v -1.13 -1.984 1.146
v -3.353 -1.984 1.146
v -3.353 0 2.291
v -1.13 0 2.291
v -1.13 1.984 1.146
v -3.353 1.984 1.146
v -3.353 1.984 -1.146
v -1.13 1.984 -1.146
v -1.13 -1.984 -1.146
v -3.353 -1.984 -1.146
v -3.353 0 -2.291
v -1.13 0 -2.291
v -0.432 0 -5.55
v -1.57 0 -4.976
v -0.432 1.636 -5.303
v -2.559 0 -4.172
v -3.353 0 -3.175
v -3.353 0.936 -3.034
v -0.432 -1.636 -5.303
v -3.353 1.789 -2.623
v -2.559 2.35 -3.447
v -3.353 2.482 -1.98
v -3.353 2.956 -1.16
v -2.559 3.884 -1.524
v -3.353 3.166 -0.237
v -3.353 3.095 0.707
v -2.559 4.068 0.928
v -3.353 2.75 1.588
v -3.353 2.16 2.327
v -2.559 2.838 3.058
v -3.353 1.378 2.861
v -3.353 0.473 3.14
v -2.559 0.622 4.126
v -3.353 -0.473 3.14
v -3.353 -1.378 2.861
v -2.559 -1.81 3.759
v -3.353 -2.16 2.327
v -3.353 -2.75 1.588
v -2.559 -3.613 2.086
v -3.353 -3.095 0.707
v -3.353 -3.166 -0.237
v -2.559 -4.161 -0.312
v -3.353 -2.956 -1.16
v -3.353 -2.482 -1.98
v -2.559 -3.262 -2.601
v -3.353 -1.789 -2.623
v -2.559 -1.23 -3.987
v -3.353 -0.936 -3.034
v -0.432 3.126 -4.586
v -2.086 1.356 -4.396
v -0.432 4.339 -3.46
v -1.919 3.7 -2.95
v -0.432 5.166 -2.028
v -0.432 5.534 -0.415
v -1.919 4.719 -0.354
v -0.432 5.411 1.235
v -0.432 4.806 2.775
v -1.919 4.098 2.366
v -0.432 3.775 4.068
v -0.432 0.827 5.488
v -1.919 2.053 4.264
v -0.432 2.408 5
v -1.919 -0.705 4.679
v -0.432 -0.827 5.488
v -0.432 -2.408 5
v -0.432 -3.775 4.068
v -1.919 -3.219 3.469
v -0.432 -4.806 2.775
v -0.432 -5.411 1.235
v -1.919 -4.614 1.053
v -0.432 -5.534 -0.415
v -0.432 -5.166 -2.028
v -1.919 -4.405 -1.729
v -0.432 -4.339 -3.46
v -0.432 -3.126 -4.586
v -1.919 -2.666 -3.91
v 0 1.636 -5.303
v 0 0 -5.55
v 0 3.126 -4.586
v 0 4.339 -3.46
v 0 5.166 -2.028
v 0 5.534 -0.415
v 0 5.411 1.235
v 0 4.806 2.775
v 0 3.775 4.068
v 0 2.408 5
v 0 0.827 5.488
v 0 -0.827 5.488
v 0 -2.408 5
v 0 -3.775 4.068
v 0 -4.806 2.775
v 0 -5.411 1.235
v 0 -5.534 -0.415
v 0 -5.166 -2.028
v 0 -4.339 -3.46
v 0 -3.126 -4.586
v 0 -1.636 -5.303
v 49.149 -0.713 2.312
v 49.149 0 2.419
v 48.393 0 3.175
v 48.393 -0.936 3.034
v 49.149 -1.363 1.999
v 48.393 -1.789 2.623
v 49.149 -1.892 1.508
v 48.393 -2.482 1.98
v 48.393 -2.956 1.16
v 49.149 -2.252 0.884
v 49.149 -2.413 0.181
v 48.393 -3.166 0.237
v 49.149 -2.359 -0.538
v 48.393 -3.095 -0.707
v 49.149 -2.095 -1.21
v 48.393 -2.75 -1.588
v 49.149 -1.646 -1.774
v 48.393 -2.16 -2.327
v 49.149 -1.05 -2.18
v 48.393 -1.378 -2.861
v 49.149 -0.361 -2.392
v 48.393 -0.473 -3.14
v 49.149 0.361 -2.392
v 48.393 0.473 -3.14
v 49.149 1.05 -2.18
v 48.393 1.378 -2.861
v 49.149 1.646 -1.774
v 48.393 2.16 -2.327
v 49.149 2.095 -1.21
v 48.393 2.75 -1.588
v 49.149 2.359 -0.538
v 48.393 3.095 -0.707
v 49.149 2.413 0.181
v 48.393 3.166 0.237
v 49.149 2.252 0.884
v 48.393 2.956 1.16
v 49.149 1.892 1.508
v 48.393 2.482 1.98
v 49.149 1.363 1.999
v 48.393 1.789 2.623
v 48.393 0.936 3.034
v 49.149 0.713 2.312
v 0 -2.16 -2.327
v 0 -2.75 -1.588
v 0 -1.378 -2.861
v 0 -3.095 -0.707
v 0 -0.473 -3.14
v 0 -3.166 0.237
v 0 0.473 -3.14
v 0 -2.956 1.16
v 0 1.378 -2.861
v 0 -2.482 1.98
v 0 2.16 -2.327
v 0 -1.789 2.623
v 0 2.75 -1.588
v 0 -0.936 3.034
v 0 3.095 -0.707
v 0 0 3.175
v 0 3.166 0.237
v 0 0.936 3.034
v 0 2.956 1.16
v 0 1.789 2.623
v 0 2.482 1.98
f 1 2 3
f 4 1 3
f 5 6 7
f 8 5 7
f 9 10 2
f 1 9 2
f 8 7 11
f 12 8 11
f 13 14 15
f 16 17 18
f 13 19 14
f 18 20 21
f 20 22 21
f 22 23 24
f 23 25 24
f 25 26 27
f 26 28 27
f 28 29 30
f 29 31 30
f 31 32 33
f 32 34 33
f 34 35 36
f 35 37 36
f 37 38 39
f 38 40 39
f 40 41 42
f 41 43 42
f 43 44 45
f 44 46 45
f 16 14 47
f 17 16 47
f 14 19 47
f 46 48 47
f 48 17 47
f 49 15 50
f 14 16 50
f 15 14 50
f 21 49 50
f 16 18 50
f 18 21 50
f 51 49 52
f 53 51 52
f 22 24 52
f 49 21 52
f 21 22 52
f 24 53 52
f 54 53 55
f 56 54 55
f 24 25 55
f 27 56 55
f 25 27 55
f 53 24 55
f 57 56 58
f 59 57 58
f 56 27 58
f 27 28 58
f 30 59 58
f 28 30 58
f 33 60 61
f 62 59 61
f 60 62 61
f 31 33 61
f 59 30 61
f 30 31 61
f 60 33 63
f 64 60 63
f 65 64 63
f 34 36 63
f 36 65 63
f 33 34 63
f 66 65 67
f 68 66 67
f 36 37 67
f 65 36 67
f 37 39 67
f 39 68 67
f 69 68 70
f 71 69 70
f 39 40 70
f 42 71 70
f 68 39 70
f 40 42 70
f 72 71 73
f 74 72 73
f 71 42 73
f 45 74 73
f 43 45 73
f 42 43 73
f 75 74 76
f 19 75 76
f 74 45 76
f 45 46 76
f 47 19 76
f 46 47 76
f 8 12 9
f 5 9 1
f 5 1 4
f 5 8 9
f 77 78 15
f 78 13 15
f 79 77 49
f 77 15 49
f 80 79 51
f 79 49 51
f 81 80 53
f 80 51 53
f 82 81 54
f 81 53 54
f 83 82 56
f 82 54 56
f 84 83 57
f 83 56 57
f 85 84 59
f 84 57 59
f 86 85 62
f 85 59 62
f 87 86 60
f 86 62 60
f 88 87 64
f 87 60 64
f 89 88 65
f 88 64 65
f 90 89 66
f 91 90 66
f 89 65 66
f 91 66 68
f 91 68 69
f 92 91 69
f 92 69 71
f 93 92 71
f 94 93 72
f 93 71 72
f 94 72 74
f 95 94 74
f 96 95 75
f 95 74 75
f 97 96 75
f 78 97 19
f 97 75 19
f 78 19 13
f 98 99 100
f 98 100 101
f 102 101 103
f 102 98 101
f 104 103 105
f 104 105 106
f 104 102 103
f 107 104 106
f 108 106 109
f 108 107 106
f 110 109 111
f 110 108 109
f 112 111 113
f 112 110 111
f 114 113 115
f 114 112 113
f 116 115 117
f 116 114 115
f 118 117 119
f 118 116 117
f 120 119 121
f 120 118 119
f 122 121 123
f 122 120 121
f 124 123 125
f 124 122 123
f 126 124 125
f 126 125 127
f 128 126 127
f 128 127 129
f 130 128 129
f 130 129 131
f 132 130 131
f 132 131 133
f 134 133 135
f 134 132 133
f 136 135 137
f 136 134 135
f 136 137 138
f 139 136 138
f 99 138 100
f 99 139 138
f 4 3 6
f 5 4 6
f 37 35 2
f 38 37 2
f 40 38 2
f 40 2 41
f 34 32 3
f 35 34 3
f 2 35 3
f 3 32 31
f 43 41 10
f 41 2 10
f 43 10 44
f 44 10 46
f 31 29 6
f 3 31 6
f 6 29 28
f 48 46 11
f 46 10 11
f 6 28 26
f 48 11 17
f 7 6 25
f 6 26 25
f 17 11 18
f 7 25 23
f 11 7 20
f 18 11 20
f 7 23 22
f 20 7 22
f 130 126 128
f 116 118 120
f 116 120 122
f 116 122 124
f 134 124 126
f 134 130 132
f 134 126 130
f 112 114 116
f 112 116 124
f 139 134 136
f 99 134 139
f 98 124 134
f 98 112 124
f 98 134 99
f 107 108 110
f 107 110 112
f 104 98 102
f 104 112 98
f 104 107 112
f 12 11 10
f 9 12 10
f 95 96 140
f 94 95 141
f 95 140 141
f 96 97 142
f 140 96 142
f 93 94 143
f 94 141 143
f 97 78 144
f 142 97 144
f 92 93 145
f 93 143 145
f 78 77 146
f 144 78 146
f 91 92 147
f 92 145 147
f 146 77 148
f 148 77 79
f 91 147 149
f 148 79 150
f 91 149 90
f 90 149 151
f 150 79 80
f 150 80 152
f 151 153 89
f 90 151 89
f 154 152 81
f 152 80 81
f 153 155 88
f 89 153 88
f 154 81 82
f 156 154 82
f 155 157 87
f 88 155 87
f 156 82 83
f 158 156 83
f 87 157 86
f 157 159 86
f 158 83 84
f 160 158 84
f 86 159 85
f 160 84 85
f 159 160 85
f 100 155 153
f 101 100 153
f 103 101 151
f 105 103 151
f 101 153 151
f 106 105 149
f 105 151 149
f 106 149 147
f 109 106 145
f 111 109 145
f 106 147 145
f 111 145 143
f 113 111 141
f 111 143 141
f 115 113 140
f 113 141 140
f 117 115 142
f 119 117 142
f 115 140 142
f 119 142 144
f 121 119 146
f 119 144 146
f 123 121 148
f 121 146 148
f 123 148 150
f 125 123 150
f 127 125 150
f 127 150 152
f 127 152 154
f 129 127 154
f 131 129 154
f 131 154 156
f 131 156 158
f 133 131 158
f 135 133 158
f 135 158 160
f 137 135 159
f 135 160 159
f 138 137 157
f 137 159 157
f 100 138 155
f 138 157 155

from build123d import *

# Parameters (mm, degrees)
SKETCH2_R           = 3.175
BOSS_EXTRUDE1_DEPTH = 49.149
CUT_EXTRUDE1_DEPTH  = 2.2225
CHAMFER1_SIZE       = 0.75565


with BuildPart() as part:
    # Sketch1 → Revolve1 (revolve)
    with BuildSketch(Plane.XY, mode=Mode.PRIVATE) as revolve1_sk:
        with BuildLine():
            Line((-3.3528, 3.175), (-3.3528, 0))
            Line((-3.3528, 0), (0, 0))
            Line((0, 0), (0, 5.5499))
            Line((0, 5.5499), (-0.4318, 5.5499))
            ThreePointArc((-0.4318, 5.5499), (-2.086170702, 4.600900596), (-3.3528, 3.175))
        make_face()
    revolve(revolve1_sk.sketch.rotate(Axis((-3.3528, 0, 0), (1, 0, 0)), 270), axis=Axis((-3.3528, 0, 0), (1, 0, 0)))

    # Sketch2 → Boss-Extrude1 (add)
    with BuildSketch(Plane(origin=(0, 0, 0), x_dir=(0, 0, -1), z_dir=(1, 0, 0))):
        with Locations(Location((0, 0, 0), (0, 0, 180))):
            Circle(SKETCH2_R)
    extrude(amount=BOSS_EXTRUDE1_DEPTH)

    # Sketch3 → Cut-Extrude1 (cut)
    with BuildSketch(Plane.ZY.offset(3.3528)):
        Polygon((2.291358881, 0), (1.14567944, 1.984375), (-1.14567944, 1.984375), (-2.291358881, 0), (-1.14567944, -1.984375), (1.14567944, -1.984375), align=None)
    extrude(amount=-CUT_EXTRUDE1_DEPTH, mode=Mode.SUBTRACT)

    # Chamfer1
    chamfer1_edges = [part.edges().sort_by_distance(p)[0] for p in [
        (49.149, 0, -3.175),
    ]]
    chamfer(chamfer1_edges, length=CHAMFER1_SIZE)


solid = part.part
